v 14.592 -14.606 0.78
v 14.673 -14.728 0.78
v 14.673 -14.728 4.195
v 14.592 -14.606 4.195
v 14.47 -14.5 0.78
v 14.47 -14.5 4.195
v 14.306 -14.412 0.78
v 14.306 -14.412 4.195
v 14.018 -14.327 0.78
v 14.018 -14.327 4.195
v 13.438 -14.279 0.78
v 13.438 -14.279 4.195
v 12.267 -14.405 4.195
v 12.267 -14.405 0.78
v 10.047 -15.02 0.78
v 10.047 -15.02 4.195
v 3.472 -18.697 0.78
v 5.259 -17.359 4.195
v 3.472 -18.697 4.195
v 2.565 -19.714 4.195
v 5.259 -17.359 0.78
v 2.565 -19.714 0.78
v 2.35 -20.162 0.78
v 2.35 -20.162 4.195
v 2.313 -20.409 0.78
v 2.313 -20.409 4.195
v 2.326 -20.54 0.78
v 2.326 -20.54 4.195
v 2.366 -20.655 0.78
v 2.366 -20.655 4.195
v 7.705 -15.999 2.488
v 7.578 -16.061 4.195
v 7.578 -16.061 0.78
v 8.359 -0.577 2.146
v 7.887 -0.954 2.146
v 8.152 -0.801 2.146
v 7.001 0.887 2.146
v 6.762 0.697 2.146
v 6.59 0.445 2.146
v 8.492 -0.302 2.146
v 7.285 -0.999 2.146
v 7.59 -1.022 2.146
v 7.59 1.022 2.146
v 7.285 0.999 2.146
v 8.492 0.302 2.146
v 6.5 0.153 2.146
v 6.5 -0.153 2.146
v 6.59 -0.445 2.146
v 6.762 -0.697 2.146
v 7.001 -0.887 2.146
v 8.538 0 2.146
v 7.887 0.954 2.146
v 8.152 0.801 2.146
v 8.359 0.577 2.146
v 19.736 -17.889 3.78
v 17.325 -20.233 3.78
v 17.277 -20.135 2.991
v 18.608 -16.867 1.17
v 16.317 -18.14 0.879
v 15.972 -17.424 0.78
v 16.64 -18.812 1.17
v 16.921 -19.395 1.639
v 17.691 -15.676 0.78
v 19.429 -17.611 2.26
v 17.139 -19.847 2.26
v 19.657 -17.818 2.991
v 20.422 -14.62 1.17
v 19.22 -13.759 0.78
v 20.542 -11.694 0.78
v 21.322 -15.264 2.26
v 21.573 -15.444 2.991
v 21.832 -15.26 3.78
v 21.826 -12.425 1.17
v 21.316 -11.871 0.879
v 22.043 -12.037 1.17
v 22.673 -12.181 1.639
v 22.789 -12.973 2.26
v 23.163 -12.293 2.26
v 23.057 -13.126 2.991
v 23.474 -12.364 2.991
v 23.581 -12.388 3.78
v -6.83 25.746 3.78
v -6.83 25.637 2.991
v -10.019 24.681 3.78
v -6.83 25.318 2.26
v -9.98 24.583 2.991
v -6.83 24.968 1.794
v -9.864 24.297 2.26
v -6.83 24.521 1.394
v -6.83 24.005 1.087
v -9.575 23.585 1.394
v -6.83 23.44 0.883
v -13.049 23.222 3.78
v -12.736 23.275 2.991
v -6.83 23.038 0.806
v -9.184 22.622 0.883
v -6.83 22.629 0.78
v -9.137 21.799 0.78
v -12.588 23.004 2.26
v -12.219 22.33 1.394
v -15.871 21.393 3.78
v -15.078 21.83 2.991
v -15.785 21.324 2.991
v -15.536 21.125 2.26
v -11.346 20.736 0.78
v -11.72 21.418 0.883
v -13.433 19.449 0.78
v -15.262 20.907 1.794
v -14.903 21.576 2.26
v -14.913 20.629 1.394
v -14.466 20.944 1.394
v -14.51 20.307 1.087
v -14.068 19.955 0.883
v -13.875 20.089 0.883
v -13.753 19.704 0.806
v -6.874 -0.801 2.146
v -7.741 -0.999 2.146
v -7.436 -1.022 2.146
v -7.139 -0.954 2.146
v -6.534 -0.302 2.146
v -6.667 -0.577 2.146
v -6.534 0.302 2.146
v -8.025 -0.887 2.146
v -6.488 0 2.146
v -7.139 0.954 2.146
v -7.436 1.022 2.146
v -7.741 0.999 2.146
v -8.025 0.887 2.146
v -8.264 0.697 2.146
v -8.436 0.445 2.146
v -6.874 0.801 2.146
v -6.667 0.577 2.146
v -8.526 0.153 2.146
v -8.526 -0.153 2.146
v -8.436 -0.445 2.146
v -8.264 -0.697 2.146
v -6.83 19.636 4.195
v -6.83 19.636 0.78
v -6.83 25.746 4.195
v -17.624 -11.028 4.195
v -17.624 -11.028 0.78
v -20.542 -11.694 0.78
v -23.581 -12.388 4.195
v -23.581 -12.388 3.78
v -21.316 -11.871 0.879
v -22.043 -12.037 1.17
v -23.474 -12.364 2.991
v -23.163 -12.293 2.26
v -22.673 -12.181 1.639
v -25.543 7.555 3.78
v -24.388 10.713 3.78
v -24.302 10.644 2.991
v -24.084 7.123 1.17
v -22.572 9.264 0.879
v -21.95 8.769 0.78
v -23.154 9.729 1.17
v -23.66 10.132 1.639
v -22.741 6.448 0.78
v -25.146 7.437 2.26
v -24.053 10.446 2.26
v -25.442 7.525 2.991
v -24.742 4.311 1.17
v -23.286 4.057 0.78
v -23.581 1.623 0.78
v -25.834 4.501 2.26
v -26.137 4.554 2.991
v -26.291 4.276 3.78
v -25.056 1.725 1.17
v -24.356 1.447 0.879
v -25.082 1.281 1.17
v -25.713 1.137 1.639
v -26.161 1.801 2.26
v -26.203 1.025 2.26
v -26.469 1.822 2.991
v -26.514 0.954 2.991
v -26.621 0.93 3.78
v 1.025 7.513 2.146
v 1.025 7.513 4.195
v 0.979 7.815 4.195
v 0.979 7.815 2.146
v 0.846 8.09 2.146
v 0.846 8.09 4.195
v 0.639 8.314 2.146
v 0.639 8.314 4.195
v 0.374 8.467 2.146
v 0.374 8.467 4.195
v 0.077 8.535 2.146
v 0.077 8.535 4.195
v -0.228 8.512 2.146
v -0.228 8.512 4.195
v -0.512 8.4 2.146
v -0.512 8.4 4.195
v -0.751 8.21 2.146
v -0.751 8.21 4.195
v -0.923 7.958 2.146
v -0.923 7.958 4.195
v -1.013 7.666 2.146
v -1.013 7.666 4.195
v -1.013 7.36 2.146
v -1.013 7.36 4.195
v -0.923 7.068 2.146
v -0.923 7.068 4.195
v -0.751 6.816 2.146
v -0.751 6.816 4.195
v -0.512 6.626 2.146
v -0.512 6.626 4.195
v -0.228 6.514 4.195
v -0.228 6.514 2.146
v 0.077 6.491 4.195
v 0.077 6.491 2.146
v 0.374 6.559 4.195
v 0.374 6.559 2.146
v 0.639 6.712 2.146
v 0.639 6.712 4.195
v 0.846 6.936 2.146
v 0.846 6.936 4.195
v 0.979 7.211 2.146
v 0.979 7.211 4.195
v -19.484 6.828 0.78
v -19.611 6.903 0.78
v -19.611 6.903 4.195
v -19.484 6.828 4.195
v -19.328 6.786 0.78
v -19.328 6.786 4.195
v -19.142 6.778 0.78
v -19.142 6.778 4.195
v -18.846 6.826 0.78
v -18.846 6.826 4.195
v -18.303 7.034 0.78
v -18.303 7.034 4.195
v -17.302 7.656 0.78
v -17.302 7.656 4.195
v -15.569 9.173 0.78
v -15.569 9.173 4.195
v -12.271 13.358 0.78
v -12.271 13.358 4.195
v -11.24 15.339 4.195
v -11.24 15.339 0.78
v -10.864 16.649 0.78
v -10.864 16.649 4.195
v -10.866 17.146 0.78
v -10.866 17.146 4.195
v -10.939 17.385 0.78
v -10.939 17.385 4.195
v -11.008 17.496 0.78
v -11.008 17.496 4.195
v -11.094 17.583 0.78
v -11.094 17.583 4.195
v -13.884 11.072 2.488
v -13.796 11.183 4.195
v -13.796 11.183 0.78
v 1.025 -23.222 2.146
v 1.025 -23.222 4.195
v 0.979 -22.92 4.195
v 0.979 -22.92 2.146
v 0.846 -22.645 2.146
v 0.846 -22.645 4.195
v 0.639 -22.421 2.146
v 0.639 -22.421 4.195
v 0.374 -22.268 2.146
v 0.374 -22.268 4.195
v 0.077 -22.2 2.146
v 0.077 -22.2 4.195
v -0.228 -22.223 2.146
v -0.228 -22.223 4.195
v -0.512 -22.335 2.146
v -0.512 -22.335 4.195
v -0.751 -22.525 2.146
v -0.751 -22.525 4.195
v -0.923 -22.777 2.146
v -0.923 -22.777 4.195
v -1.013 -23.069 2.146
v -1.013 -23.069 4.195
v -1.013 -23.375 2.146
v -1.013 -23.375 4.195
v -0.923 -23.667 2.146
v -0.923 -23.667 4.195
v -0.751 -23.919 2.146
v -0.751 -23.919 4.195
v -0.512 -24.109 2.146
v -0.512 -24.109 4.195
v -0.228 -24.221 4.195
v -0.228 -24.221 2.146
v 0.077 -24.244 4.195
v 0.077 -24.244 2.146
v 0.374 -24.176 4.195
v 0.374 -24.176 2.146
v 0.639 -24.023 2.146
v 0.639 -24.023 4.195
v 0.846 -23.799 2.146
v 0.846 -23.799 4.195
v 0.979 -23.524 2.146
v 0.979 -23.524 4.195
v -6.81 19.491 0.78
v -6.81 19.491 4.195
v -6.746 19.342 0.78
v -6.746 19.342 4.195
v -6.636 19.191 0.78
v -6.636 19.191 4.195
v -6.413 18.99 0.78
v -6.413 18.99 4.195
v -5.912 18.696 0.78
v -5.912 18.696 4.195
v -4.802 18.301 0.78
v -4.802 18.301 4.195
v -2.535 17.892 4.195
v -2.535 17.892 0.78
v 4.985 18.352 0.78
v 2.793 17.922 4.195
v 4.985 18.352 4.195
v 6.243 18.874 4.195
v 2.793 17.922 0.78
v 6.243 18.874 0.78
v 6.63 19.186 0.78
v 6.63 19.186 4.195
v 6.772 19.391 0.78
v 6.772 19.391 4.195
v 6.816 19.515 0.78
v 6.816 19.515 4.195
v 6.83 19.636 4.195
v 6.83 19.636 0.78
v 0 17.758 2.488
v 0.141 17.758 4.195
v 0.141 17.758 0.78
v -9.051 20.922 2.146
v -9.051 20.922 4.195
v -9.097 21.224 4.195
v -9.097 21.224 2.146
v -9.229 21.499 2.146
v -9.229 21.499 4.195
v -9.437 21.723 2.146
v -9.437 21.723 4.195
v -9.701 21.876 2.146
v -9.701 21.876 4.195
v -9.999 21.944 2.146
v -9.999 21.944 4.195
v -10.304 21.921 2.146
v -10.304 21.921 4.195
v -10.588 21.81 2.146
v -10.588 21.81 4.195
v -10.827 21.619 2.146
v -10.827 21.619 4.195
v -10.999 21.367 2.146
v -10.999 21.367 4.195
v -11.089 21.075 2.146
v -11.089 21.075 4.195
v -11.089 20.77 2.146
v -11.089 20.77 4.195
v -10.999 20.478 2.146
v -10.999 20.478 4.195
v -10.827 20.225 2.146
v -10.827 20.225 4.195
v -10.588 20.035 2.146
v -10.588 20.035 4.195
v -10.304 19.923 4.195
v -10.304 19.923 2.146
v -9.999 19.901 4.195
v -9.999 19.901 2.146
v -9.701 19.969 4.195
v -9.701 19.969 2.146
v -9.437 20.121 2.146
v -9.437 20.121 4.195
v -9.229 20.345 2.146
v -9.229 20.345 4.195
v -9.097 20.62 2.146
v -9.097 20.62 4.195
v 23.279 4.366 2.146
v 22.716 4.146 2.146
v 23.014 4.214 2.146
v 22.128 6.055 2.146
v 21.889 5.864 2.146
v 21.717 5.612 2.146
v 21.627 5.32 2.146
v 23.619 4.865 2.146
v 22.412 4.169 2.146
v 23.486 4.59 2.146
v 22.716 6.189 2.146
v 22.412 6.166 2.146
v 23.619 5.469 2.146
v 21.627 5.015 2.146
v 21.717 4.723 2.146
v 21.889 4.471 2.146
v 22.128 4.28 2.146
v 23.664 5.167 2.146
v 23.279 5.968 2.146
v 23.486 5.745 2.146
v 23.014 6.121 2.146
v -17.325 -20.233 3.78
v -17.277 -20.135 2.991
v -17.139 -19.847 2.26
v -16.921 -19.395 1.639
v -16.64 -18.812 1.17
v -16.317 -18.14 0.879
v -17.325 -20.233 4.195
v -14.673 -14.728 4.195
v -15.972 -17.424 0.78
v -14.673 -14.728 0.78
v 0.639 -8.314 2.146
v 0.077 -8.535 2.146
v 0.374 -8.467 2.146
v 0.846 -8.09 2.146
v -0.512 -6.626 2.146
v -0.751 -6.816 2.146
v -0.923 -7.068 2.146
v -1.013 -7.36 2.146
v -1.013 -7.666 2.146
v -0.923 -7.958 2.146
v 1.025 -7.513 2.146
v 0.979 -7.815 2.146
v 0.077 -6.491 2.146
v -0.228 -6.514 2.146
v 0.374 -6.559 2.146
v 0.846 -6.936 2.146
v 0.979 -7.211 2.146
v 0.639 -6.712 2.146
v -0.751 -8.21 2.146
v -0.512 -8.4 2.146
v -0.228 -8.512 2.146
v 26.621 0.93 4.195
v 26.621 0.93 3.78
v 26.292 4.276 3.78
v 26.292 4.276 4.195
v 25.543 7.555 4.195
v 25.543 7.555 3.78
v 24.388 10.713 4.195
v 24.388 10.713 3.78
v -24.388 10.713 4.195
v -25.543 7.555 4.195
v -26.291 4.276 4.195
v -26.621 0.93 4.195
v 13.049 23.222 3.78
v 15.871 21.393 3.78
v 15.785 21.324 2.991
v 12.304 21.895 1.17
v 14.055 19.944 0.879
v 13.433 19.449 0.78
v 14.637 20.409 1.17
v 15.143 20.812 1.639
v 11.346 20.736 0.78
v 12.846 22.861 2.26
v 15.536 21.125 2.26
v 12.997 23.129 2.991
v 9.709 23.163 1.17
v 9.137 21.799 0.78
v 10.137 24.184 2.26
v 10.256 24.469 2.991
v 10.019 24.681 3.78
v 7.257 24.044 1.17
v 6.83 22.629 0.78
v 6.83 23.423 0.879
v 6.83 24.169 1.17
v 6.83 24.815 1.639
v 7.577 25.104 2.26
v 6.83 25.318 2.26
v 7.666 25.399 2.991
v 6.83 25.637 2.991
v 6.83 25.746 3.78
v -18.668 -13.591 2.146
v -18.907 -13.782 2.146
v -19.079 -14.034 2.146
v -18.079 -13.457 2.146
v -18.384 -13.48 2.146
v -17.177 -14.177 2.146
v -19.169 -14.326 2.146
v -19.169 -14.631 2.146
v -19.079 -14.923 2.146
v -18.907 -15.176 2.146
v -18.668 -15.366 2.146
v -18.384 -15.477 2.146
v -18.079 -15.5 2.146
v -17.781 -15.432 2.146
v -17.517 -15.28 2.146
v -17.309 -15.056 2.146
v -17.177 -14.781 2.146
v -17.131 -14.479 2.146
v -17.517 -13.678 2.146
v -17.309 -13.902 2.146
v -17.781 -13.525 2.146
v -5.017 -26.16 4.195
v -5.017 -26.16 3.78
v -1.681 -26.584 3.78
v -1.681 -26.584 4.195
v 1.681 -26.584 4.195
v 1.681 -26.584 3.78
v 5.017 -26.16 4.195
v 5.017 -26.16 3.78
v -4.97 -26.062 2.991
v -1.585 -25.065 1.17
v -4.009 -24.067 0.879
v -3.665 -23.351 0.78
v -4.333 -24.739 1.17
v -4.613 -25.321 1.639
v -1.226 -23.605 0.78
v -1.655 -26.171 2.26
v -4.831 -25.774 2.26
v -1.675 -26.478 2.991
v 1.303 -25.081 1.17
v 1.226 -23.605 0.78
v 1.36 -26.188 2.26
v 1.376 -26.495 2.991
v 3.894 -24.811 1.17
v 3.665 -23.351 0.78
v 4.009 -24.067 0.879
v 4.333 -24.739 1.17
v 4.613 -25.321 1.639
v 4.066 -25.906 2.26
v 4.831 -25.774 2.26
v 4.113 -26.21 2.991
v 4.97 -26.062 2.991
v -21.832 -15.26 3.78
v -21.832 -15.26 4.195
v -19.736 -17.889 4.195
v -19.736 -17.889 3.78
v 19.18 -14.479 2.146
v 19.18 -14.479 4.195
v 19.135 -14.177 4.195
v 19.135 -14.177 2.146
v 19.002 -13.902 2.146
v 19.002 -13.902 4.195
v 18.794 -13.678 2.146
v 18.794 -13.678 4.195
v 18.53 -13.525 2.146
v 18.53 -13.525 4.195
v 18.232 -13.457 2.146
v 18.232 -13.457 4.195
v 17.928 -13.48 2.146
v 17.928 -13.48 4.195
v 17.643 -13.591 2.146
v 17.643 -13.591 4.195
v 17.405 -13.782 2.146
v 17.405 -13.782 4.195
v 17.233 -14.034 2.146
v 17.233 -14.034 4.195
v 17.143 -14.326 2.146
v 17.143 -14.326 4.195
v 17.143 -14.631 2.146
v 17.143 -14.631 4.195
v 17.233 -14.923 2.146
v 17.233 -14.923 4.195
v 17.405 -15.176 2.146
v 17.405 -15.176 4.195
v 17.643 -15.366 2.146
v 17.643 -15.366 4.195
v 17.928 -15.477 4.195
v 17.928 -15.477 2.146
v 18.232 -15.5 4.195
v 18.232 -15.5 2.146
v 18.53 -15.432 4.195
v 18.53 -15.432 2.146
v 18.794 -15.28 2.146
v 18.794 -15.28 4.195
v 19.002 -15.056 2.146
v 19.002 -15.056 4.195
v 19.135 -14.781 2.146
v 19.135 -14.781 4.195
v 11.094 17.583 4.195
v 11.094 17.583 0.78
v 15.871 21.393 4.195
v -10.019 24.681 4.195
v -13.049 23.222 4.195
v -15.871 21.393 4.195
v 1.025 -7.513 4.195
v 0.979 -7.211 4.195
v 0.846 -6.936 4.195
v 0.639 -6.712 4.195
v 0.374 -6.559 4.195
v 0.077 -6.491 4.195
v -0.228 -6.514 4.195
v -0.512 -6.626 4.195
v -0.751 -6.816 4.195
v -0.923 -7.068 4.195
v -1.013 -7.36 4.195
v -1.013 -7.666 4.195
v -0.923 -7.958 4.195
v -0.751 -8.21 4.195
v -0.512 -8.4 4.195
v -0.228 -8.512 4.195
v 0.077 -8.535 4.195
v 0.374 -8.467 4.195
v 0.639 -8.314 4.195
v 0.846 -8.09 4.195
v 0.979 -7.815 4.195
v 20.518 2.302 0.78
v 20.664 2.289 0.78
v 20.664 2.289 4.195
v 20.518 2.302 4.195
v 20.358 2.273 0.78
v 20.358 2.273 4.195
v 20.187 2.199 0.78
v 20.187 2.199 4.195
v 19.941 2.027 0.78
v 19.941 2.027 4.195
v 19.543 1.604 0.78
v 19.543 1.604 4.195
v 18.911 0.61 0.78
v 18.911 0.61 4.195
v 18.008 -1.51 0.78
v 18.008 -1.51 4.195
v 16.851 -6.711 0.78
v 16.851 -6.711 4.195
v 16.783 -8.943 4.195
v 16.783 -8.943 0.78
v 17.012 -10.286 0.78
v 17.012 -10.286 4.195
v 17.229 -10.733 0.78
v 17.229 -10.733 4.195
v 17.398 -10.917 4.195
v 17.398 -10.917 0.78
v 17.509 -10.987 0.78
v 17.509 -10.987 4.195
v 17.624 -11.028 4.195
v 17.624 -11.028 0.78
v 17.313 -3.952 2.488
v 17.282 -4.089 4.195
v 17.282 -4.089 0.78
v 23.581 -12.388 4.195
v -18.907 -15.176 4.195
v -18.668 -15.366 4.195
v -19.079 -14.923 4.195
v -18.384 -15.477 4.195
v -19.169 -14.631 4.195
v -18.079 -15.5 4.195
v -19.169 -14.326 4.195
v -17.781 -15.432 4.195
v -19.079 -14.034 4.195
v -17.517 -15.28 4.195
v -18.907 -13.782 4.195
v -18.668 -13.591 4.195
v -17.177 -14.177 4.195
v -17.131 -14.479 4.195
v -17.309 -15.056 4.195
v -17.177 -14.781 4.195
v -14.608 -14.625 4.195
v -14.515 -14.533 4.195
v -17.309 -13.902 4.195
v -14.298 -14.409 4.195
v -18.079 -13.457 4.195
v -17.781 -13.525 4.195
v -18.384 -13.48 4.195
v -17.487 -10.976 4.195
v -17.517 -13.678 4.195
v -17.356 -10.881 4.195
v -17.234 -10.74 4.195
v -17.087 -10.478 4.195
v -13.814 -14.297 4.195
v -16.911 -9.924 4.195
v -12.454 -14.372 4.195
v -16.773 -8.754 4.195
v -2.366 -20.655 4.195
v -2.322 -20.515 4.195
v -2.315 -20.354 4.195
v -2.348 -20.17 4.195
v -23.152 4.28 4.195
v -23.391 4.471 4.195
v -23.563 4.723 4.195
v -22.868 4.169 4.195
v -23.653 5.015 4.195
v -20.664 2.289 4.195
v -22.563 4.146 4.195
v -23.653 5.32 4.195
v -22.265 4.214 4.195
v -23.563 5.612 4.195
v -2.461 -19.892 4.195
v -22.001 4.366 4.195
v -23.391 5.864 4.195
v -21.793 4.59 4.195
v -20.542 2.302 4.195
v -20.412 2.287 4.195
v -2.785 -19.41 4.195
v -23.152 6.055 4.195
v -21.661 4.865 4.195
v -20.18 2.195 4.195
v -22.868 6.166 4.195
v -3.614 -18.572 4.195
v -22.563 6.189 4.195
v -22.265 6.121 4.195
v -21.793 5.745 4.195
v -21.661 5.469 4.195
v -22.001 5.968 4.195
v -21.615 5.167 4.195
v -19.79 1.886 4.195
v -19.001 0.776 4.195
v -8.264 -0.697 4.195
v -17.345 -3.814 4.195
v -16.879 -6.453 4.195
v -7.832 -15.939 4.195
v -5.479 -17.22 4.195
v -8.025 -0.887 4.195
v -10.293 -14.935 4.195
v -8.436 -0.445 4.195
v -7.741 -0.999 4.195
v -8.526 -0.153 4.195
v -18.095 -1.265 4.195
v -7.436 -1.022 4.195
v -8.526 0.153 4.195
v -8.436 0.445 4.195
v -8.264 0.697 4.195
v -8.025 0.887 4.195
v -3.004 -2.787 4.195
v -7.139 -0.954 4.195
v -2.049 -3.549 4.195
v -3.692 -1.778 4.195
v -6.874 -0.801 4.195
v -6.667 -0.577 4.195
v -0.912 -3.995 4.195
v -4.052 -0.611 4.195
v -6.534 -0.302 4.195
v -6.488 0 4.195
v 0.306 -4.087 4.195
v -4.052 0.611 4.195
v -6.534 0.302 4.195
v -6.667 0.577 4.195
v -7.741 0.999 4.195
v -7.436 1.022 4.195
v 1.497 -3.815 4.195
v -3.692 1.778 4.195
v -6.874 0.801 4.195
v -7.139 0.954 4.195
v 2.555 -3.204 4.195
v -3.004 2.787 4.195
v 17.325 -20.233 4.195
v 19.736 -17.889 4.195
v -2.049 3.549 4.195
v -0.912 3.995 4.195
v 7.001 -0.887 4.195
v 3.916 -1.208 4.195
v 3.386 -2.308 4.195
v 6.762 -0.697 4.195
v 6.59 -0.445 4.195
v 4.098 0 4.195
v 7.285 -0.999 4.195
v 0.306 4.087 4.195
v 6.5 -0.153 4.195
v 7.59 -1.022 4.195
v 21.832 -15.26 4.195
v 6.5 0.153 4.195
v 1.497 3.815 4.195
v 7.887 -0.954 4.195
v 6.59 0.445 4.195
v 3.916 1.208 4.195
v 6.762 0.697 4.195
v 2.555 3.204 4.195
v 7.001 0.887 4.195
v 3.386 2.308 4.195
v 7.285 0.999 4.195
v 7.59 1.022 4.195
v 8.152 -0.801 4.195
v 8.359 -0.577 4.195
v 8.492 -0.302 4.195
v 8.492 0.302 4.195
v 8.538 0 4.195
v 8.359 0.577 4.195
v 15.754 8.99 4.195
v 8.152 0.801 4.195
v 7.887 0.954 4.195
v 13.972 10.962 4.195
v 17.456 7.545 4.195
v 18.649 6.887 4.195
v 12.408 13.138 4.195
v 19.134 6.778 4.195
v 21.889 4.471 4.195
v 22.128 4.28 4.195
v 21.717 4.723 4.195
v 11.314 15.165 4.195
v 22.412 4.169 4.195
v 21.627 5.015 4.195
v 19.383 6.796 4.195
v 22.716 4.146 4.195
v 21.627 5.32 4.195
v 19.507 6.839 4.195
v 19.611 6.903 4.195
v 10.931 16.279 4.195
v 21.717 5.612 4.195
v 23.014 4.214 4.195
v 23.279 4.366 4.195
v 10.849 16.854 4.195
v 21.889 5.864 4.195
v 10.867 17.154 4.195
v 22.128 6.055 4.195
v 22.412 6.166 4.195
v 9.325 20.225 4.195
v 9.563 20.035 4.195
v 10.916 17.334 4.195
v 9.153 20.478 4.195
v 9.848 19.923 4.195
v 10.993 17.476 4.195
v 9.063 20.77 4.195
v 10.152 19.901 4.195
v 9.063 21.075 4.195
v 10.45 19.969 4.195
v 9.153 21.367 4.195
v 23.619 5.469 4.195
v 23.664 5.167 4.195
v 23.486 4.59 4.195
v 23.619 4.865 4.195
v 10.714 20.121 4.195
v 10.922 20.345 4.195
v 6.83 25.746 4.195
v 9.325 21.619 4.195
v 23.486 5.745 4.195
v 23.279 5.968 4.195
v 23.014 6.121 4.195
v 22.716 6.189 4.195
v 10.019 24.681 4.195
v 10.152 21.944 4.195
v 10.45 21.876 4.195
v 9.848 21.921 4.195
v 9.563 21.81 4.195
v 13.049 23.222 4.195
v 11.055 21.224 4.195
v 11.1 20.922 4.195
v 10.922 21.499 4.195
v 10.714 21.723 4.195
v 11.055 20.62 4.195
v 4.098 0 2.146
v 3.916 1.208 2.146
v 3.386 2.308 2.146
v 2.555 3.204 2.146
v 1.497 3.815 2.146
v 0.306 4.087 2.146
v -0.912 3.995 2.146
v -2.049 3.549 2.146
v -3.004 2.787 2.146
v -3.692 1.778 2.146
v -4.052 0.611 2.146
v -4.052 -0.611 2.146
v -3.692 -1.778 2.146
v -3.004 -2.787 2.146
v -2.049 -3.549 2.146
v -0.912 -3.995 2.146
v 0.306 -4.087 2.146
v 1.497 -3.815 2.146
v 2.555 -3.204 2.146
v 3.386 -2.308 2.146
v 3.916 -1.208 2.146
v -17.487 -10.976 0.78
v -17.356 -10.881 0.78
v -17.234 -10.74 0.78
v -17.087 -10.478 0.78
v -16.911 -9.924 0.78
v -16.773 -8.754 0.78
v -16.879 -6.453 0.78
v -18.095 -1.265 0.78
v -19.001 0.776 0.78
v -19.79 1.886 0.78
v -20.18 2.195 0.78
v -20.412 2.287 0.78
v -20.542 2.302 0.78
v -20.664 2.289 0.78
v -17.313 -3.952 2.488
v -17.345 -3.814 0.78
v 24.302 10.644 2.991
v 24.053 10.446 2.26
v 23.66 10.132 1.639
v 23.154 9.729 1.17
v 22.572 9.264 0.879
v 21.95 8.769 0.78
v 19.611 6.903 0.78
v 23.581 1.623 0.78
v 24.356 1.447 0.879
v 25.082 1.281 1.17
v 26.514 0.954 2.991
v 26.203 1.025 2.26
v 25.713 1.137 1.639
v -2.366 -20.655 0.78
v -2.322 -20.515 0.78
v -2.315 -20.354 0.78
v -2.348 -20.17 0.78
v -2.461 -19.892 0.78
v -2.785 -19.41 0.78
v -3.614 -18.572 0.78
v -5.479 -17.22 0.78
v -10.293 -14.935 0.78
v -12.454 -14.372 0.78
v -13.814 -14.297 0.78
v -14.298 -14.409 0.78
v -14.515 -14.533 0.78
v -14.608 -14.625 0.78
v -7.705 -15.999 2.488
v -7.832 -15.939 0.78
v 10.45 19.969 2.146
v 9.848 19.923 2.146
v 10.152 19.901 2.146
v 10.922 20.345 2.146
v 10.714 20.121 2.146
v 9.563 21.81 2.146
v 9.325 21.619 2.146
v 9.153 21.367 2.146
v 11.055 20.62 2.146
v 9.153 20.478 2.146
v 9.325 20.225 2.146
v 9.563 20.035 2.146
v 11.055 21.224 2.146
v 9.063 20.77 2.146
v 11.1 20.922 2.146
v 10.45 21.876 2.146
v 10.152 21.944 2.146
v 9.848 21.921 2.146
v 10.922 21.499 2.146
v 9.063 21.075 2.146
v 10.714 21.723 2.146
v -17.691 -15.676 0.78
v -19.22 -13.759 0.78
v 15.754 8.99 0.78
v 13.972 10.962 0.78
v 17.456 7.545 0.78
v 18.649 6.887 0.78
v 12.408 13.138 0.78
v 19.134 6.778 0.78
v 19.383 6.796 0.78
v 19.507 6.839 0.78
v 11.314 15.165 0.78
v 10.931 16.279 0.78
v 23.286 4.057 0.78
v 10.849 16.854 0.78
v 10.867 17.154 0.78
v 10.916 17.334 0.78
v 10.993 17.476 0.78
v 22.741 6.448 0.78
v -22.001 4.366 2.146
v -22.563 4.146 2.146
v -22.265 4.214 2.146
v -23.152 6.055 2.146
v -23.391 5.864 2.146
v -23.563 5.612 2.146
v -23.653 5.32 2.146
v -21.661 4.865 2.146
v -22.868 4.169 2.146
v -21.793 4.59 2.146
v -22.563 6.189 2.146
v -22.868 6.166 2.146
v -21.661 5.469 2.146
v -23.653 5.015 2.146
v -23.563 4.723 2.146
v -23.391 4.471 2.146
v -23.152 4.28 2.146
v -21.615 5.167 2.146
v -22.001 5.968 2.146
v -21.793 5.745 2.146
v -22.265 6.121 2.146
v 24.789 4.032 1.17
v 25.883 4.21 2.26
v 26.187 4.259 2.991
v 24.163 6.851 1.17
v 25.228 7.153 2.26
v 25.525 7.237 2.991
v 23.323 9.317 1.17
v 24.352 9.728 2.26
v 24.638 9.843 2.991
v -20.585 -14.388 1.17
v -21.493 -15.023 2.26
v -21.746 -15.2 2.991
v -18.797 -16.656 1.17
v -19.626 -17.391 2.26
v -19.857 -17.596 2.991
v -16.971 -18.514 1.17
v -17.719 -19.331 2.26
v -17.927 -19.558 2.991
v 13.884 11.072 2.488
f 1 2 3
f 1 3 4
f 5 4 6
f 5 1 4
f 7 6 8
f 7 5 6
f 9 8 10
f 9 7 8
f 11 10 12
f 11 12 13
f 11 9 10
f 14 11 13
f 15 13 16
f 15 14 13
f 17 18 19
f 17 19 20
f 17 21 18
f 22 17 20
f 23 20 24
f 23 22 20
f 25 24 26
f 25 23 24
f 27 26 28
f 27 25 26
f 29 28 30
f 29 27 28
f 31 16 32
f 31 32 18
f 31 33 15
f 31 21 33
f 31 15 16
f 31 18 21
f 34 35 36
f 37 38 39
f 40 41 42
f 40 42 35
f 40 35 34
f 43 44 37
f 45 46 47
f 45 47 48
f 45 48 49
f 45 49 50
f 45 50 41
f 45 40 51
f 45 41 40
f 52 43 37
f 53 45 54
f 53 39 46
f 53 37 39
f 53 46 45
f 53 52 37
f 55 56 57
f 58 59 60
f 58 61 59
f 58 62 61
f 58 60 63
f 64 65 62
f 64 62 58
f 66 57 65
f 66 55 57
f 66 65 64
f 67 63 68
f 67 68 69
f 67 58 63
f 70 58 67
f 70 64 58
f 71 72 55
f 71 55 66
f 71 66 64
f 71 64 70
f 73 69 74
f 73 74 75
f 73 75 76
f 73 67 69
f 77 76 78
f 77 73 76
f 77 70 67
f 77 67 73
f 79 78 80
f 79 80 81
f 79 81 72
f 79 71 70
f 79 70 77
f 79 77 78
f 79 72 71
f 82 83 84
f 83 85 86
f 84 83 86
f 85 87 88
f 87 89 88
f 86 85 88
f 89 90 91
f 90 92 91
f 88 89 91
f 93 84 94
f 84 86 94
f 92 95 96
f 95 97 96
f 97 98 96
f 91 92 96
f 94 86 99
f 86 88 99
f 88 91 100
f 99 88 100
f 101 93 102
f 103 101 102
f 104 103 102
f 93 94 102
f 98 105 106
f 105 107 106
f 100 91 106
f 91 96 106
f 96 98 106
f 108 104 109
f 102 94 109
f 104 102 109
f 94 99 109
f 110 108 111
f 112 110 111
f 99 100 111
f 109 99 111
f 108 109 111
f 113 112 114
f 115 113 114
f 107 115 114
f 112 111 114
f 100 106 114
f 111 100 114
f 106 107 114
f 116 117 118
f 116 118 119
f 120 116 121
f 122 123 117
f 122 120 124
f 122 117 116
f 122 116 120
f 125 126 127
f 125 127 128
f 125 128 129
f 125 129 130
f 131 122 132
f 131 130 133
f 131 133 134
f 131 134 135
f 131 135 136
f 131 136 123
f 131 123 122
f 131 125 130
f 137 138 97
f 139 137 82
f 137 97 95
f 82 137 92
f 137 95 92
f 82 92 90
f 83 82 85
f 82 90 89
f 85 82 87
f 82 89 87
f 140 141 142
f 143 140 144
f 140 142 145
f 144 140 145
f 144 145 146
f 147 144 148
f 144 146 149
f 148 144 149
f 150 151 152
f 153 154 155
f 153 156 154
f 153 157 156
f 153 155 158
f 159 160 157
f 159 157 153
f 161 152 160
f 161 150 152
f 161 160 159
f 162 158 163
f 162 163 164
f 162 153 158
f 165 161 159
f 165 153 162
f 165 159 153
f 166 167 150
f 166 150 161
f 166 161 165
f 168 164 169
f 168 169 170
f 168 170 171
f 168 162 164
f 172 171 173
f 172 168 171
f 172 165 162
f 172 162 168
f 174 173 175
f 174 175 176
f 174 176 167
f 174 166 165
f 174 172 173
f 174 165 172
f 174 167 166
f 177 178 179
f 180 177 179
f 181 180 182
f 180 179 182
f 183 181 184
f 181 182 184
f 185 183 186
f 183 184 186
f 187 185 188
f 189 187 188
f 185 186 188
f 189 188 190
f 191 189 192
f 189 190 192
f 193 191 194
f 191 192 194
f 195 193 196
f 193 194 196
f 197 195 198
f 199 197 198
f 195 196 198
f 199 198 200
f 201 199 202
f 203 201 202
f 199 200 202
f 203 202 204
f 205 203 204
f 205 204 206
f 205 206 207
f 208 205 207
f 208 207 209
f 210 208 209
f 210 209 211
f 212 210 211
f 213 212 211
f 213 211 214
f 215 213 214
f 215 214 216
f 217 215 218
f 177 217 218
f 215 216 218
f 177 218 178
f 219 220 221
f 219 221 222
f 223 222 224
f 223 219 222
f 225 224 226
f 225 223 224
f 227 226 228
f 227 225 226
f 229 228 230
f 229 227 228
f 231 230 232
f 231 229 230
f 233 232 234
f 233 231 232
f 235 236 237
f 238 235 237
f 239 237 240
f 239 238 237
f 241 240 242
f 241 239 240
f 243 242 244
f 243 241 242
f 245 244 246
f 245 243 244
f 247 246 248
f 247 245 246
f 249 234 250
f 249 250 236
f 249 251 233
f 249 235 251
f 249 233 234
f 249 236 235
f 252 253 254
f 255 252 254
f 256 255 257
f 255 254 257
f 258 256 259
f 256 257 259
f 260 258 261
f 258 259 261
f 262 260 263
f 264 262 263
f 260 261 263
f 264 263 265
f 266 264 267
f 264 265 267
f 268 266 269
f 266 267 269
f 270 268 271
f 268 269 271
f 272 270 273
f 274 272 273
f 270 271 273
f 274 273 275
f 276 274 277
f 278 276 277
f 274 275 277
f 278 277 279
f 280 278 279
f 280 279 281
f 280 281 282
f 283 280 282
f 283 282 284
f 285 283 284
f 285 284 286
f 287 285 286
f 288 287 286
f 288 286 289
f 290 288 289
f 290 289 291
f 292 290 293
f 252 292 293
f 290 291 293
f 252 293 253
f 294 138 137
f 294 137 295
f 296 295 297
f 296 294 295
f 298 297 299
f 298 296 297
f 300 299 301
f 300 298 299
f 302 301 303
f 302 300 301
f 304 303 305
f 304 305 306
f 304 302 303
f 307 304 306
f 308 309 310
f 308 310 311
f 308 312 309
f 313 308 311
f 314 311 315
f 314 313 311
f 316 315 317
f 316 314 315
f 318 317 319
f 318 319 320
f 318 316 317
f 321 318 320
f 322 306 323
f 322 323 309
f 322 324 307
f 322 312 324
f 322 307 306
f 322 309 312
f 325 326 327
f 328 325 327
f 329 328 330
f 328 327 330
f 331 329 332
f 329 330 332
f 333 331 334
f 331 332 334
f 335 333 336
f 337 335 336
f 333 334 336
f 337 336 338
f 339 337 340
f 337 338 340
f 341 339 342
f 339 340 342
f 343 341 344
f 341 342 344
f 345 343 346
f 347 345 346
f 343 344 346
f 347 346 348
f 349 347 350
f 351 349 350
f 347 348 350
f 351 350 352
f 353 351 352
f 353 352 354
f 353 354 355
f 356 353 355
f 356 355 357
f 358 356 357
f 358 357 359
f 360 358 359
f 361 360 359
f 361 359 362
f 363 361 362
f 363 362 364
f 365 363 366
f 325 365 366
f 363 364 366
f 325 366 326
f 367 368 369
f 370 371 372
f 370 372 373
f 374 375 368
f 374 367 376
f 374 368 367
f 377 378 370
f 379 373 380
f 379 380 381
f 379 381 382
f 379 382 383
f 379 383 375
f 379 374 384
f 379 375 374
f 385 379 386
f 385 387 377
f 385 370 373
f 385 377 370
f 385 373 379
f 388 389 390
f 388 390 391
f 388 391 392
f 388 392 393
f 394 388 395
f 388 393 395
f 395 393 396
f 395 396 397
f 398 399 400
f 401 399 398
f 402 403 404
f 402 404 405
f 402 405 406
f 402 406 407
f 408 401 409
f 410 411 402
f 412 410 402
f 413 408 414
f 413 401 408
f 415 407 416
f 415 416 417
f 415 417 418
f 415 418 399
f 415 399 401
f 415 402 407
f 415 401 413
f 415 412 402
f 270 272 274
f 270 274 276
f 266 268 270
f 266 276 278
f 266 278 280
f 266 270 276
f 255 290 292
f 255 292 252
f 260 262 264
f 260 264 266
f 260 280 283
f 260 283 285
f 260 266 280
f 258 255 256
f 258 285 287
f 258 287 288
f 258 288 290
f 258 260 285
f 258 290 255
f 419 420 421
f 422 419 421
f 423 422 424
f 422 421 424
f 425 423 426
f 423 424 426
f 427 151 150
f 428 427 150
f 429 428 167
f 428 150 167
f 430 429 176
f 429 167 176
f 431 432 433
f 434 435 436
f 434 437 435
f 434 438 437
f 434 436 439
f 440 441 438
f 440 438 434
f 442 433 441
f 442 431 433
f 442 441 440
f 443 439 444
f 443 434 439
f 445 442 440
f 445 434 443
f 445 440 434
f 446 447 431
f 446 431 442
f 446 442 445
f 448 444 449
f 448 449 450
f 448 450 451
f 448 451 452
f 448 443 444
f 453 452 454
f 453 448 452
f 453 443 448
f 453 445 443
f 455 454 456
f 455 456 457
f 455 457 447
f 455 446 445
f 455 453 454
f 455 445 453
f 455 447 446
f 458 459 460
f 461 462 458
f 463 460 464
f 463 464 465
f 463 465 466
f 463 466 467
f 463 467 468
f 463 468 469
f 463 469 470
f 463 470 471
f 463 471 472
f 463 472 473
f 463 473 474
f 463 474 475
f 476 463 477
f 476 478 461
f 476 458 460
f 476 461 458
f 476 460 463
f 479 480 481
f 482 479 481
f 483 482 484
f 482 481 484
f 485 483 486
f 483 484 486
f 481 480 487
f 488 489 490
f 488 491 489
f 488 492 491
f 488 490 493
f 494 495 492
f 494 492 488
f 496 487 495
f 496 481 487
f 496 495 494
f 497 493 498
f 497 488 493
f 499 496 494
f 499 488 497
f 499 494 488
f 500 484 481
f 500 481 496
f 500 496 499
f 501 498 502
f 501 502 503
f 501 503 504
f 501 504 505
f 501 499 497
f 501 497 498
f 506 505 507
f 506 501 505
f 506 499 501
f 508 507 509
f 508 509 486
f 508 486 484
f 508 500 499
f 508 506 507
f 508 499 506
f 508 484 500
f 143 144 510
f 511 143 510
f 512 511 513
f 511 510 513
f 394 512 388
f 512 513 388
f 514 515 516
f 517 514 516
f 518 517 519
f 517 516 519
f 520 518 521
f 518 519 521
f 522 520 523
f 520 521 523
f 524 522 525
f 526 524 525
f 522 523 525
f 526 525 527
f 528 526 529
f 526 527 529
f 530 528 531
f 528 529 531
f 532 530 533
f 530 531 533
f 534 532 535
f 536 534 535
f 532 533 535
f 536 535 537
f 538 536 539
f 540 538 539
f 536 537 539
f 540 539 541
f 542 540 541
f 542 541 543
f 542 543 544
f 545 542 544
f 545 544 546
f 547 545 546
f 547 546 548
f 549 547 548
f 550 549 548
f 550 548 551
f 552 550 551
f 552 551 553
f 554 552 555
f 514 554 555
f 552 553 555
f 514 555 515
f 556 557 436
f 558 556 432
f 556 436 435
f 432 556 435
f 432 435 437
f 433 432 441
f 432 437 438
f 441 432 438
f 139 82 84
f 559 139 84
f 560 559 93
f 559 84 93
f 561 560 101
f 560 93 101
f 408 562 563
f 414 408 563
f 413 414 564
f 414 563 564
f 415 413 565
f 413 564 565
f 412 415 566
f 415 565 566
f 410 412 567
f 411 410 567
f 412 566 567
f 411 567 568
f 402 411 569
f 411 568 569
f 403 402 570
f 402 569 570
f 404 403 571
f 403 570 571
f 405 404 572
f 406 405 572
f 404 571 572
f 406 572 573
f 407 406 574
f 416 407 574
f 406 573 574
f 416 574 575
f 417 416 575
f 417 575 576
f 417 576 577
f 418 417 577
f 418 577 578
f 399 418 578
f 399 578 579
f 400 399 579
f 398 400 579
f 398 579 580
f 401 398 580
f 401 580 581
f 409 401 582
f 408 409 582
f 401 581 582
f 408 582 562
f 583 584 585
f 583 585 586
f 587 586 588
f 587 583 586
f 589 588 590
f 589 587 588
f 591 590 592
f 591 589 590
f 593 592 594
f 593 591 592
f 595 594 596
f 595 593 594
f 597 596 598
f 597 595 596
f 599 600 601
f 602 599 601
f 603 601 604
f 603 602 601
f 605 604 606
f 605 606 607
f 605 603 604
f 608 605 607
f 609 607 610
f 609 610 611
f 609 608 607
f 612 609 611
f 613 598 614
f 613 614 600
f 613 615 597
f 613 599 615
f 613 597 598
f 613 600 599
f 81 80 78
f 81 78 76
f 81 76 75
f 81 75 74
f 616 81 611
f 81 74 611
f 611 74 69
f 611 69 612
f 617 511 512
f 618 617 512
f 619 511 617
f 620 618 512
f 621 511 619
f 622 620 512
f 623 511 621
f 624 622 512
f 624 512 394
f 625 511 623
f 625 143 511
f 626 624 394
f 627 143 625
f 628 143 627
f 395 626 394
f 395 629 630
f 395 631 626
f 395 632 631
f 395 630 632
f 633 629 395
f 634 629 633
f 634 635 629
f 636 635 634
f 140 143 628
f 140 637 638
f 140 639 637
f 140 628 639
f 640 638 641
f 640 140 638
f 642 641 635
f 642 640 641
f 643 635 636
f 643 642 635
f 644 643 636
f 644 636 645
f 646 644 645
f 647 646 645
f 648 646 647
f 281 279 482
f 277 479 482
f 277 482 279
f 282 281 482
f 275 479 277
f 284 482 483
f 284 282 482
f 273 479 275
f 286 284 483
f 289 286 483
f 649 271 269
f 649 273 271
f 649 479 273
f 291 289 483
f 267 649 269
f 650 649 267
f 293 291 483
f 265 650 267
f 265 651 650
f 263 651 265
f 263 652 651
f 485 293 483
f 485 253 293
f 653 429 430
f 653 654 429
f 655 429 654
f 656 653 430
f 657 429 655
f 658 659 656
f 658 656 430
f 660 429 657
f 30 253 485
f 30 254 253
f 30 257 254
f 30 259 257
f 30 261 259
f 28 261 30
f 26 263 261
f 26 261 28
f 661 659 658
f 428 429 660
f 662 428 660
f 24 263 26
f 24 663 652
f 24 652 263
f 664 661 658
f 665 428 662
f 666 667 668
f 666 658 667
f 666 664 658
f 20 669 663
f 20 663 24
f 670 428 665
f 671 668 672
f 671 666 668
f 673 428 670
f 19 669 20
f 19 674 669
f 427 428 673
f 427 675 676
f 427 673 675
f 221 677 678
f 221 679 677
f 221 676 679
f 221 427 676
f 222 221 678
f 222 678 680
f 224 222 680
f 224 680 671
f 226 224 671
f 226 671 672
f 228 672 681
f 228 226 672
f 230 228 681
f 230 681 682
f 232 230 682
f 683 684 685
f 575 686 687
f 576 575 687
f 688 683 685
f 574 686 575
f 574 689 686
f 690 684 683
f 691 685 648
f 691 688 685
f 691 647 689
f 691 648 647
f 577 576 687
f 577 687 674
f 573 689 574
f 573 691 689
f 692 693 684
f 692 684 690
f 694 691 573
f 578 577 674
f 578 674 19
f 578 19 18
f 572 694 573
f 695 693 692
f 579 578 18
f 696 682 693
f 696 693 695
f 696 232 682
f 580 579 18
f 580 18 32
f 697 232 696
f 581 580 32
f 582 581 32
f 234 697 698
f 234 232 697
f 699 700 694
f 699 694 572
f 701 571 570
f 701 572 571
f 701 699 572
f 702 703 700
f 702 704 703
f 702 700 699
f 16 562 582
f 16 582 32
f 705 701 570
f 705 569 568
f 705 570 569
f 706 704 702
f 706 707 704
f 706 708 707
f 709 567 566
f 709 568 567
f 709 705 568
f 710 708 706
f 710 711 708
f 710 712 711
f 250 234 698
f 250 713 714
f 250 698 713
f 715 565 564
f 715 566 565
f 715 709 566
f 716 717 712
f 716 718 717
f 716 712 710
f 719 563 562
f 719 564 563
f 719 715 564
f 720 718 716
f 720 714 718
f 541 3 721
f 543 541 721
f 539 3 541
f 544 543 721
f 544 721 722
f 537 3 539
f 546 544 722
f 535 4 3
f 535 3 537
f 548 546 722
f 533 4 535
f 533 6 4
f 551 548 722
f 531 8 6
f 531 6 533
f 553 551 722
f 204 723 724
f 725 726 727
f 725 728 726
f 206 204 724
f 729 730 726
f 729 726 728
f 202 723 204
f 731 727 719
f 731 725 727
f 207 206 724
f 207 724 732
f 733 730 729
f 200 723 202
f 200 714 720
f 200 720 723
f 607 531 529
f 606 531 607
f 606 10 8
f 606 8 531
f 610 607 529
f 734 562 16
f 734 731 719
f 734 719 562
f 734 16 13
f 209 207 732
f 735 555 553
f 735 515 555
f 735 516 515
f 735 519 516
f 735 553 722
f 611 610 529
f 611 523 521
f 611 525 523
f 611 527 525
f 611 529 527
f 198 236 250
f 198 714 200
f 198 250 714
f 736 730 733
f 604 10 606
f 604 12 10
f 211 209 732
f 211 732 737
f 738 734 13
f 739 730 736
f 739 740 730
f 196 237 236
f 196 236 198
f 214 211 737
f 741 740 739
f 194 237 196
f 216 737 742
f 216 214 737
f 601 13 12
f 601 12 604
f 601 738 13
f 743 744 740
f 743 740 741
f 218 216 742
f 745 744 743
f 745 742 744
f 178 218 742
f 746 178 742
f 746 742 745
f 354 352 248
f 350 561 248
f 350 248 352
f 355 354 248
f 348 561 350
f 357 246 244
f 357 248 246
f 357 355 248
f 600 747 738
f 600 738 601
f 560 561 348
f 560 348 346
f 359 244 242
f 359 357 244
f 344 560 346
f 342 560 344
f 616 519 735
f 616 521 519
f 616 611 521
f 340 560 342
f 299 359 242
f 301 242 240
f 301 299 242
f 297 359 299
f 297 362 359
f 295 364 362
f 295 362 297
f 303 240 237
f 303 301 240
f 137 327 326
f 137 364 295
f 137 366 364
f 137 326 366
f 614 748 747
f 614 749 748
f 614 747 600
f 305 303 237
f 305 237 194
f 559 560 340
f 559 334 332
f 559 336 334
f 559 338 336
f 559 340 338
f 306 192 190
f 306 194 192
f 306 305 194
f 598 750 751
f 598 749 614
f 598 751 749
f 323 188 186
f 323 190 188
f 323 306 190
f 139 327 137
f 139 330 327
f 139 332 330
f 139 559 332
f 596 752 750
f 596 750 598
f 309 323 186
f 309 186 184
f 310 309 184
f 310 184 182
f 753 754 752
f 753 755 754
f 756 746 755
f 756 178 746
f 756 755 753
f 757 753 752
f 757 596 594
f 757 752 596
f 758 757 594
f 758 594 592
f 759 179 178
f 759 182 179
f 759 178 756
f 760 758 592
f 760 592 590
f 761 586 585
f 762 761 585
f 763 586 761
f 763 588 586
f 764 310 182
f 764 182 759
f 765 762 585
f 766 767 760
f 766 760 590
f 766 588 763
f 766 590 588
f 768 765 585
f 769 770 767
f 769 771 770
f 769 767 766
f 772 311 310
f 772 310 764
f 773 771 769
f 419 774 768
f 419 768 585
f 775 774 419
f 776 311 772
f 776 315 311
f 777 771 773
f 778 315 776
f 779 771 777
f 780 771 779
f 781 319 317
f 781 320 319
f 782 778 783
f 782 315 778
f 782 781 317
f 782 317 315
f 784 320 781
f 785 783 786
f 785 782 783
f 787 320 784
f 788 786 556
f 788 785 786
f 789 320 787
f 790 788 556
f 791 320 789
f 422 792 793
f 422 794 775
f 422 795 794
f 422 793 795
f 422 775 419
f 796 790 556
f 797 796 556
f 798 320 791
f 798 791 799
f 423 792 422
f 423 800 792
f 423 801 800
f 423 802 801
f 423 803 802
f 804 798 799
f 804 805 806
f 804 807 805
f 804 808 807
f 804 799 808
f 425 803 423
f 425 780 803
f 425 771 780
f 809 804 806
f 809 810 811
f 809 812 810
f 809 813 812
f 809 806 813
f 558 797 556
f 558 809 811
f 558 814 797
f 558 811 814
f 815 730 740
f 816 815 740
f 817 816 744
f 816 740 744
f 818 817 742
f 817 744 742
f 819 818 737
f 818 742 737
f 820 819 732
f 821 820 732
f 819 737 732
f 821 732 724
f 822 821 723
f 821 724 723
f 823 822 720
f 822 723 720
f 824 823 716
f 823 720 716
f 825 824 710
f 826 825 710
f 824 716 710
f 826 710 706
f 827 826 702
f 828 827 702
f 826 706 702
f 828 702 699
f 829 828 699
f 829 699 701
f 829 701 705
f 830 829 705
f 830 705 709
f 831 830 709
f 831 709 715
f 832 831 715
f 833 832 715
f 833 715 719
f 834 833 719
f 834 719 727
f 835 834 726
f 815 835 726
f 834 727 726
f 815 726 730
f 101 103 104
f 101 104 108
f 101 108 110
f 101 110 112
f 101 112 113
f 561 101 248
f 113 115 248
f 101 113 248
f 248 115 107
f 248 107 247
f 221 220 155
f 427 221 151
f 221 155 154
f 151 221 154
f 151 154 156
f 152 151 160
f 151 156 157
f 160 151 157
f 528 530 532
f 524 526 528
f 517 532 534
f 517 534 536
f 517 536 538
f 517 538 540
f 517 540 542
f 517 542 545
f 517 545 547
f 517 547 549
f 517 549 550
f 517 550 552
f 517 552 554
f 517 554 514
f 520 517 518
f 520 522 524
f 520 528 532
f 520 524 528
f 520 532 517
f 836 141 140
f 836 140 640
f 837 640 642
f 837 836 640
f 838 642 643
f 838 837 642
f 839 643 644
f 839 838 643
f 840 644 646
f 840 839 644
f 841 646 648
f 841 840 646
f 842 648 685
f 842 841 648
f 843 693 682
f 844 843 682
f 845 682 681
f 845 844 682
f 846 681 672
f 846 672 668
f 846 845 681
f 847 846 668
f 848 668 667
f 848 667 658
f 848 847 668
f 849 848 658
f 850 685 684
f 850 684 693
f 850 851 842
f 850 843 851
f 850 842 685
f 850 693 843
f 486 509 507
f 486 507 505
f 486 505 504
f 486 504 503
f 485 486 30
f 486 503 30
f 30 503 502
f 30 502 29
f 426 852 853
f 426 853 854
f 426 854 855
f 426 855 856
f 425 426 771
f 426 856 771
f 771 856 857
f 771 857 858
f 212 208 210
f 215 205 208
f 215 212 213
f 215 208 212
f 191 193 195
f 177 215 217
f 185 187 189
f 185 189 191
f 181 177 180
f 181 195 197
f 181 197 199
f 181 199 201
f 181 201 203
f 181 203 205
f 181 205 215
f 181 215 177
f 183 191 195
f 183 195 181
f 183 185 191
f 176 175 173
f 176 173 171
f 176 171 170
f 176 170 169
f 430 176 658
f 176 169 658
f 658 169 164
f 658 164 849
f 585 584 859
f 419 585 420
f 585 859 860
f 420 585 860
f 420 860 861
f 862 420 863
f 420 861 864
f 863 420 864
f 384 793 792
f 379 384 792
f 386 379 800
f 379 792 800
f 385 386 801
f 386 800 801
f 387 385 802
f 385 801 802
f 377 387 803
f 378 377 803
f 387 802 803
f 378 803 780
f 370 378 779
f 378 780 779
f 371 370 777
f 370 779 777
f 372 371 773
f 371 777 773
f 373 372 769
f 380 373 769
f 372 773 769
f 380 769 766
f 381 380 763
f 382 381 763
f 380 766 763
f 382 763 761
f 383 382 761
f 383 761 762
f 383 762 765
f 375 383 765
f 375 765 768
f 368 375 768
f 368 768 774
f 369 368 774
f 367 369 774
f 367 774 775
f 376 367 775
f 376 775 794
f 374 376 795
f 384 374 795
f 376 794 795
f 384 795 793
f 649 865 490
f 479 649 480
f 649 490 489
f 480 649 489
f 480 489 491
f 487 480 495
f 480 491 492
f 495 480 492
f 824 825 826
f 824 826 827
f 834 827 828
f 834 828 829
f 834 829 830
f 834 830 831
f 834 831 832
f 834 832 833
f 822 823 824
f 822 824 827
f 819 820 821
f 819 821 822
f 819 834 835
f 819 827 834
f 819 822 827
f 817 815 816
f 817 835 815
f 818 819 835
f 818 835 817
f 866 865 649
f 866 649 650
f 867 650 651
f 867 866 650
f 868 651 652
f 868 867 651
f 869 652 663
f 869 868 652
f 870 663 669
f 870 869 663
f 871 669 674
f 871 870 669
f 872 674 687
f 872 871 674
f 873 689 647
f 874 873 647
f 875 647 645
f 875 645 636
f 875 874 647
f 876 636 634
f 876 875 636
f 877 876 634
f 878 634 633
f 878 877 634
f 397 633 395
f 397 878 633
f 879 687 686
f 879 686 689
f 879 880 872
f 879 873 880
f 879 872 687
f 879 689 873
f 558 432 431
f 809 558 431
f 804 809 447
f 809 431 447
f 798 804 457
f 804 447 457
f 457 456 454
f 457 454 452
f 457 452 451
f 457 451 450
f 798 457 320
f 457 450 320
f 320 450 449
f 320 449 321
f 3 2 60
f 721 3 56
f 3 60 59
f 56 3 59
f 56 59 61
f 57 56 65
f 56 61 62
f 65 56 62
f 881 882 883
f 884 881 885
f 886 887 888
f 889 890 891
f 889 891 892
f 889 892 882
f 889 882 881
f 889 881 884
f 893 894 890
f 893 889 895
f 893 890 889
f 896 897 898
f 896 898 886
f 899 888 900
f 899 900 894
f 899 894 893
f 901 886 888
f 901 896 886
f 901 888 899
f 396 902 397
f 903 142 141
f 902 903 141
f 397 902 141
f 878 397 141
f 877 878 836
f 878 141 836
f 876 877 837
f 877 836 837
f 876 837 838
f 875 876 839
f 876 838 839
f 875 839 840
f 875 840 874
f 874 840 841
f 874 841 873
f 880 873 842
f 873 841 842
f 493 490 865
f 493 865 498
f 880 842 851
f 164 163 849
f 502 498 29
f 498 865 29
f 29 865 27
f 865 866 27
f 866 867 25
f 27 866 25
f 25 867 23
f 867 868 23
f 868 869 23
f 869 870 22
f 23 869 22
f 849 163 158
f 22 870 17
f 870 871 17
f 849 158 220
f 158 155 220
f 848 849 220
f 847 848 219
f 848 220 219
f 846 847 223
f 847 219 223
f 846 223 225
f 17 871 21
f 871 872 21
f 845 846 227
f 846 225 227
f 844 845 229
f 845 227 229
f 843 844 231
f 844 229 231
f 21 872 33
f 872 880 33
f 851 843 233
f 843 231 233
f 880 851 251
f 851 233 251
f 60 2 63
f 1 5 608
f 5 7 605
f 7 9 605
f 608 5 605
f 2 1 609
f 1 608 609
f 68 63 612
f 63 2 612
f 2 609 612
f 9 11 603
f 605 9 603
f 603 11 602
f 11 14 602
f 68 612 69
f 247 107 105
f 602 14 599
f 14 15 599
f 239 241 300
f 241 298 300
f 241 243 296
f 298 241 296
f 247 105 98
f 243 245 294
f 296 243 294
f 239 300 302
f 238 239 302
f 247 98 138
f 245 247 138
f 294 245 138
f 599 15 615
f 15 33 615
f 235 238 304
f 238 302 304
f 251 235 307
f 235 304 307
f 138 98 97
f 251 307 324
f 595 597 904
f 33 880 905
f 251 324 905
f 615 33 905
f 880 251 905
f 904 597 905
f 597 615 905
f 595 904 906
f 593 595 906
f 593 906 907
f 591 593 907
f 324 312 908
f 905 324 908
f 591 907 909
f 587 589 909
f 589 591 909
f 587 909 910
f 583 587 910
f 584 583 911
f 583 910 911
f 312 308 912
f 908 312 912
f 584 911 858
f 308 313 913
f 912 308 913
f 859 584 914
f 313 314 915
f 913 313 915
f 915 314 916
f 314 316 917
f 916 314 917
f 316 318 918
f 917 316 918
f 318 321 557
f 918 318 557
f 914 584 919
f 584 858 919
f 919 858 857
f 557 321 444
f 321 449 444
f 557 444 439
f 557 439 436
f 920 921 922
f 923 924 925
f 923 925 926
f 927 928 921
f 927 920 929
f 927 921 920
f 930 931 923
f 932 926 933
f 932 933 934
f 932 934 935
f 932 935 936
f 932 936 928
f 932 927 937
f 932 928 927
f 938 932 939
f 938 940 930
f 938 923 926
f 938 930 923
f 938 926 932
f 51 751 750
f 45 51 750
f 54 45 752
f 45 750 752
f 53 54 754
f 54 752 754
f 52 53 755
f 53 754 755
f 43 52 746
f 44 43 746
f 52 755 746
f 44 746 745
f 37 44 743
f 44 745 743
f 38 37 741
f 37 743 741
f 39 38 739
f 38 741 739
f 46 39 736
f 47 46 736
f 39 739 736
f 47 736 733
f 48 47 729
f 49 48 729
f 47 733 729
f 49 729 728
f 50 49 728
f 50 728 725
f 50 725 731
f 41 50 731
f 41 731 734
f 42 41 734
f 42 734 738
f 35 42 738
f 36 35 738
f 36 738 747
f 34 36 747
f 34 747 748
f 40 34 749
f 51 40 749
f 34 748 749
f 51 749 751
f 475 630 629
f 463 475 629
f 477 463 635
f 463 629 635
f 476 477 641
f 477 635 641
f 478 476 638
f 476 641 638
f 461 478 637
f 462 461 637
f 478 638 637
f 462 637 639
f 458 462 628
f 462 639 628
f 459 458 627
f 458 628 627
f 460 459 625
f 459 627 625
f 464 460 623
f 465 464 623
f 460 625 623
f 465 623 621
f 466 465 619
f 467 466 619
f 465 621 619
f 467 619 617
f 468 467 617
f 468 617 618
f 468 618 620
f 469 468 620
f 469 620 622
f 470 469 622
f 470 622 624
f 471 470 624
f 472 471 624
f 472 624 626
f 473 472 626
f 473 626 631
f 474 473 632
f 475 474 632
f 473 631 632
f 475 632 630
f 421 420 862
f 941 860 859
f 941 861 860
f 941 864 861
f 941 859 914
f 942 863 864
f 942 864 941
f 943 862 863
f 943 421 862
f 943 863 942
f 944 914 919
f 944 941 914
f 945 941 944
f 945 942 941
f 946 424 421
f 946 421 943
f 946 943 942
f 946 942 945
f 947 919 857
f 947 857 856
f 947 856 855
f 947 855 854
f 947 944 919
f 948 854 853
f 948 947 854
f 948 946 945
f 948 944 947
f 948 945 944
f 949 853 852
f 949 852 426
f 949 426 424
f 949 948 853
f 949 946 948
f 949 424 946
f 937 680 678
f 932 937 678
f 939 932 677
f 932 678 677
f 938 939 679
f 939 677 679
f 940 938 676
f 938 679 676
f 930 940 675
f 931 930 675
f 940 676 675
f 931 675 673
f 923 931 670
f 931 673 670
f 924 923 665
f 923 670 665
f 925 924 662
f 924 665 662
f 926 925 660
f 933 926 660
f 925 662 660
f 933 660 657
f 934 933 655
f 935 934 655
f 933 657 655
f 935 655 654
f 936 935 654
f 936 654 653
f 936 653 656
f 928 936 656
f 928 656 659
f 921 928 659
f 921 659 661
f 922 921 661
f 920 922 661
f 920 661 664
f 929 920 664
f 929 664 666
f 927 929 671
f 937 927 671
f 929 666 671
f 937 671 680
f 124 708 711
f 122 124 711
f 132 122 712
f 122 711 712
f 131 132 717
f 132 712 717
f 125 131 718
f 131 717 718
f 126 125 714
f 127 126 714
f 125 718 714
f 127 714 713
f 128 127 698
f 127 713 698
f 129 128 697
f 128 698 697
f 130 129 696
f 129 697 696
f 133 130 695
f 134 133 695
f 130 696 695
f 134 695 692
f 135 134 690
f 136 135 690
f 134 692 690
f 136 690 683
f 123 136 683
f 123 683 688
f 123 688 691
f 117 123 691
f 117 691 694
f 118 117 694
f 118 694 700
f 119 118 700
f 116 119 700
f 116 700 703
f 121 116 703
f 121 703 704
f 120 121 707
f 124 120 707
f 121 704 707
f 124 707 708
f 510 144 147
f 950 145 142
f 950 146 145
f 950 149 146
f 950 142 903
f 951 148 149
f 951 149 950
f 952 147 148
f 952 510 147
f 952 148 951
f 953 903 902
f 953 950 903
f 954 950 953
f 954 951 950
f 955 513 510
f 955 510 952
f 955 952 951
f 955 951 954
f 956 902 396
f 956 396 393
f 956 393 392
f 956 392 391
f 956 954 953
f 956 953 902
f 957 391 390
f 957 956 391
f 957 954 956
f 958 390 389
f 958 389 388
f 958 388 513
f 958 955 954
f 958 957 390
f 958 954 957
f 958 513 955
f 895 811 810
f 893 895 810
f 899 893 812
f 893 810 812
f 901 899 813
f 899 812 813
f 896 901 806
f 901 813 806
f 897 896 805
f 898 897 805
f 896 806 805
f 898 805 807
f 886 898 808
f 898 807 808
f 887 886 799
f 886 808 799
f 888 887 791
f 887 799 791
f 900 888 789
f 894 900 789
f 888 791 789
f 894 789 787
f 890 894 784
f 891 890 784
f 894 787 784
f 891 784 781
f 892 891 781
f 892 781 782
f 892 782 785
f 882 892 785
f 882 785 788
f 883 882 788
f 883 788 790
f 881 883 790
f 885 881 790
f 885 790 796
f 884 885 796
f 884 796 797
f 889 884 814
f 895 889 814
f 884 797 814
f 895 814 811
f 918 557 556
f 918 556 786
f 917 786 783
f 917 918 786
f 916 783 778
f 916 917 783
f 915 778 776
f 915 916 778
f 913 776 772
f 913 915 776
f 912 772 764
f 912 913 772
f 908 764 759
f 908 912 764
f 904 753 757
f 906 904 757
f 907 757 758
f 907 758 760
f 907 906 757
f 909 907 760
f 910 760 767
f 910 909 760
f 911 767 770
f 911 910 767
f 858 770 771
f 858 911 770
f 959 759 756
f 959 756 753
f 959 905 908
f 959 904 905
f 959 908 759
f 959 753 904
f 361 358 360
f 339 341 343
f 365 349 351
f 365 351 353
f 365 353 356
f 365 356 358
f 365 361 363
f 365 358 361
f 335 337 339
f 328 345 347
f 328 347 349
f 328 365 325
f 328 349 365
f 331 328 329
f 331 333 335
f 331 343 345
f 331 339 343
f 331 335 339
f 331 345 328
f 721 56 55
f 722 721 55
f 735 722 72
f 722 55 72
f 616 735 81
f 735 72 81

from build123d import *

# Parameters (mm, degrees)
EXTRUDE_2_DEPTH     = 5
SKETCH_3_R          = 1.5
SKETCH_3_R_2        = 6
CUT_EXTRUDE_2_DEPTH = 3
SCALE_1_SCALE       = 0.683
FILLET_2_R          = 3


with BuildPart() as part:
    # 草图1 → 凸台-拉伸2 (new body)
    with BuildSketch(Plane.XY):
        with BuildLine():
            Line((-10, 28.75), (-10, 37.69615365))
            ThreePointArc((-10, 37.69615365), (-16.921465826, 35.137785848), (-23.237141673, 31.321482195))
            Line((-23.237141673, 31.321482195), (-16.242757102, 25.743646628))
            add(Edge.make_bspline(
                [(-28.71255314, 10.107016979), (-26.562516563, 8.392420024), (-20.327618544, 16.210734848), (-14.092720526, 24.029049673), (-16.242757102, 25.743646628)],
                knots=[3.141592654, 3.141592654, 3.141592654, 4.71238898, 4.71238898, 6.283185307, 6.283185307, 6.283185307], degree=2, weights=[1, 0.707106781, 1, 0.707106781, 1]))
            Line((-28.71255314, 10.107016979), (-35.70693771, 15.684852545))
            ThreePointArc((-35.70693771, 15.684852545), (-38.022188575, 8.678316424), (-38.976241715, 1.361095805))
            Line((-38.976241715, 1.361095805), (-30.254386815, 3.351802271))
            add(Edge.make_bspline(
                [(-25.803968136, -16.146755973), (-23.122916377, -15.534823405), (-25.348125717, -5.785544283), (-27.573335056, 3.963734839), (-30.254386815, 3.351802271)],
                knots=[3.141592654, 3.141592654, 3.141592654, 4.71238898, 4.71238898, 6.283185307, 6.283185307, 6.283185307], degree=2, weights=[1, 0.707106781, 1, 0.707106781, 1]))
            Line((-25.803968136, -16.146755973), (-34.525823036, -18.137462439))
            ThreePointArc((-34.525823036, -18.137462439), (-30.491427816, -24.316102272), (-25.365436775, -29.624223487))
            Line((-25.365436775, -29.624223487), (-21.483846179, -21.564017561))
            add(Edge.make_bspline(
                [(-3.464468821, -30.241692343), (-2.271288538, -27.764027957), (-11.280977217, -23.425190565), (-20.290665896, -19.086353174), (-21.483846179, -21.564017561)],
                knots=[3.141592654, 3.141592654, 3.141592654, 4.71238898, 4.71238898, 6.283185307, 6.283185307, 6.283185307], degree=2, weights=[1, 0.707106781, 1, 0.707106781, 1]))
            Line((-3.464468821, -30.241692343), (-7.346059417, -38.301898269))
            ThreePointArc((-7.346059417, -38.301898269), (0, -39), (7.346059417, -38.301898269))
            Line((7.346059417, -38.301898269), (3.464468821, -30.241692343))
            add(Edge.make_bspline(
                [(21.483846179, -21.564017561), (20.290665896, -19.086353174), (11.280977217, -23.425190565), (2.271288538, -27.764027957), (3.464468821, -30.241692343)],
                knots=[3.141592654, 3.141592654, 3.141592654, 4.71238898, 4.71238898, 6.283185307, 6.283185307, 6.283185307], degree=2, weights=[1, 0.707106781, 1, 0.707106781, 1]))
            Line((21.483846179, -21.564017561), (25.365436775, -29.624223487))
            ThreePointArc((25.365436775, -29.624223487), (30.491427816, -24.316102272), (34.525823036, -18.137462439))
            Line((34.525823036, -18.137462439), (25.803968136, -16.146755973))
            add(Edge.make_bspline(
                [(30.254386815, 3.351802271), (27.573335056, 3.963734839), (25.348125717, -5.785544283), (23.122916377, -15.534823405), (25.803968136, -16.146755973)],
                knots=[3.141592654, 3.141592654, 3.141592654, 4.71238898, 4.71238898, 6.283185307, 6.283185307, 6.283185307], degree=2, weights=[1, 0.707106781, 1, 0.707106781, 1]))
            Line((30.254386815, 3.351802271), (38.976241715, 1.361095805))
            ThreePointArc((38.976241715, 1.361095805), (38.022188575, 8.678316424), (35.70693771, 15.684852545))
            Line((35.70693771, 15.684852545), (28.71255314, 10.107016979))
            add(Edge.make_bspline(
                [(16.242757102, 25.743646628), (14.092720526, 24.029049673), (20.327618544, 16.210734848), (26.562516563, 8.392420024), (28.71255314, 10.107016979)],
                knots=[3.141592654, 3.141592654, 3.141592654, 4.71238898, 4.71238898, 6.283185307, 6.283185307, 6.283185307], degree=2, weights=[1, 0.707106781, 1, 0.707106781, 1]))
            Line((16.242757102, 25.743646628), (23.237141673, 31.321482195))
            ThreePointArc((23.237141673, 31.321482195), (16.921465826, 35.137785848), (10, 37.69615365))
            Line((10, 37.69615365), (10, 28.75))
            add(Edge.make_bspline(
                [(-10, 28.75), (-10, 26), (0, 26), (10, 26), (10, 28.75)],
                knots=[3.141592654, 3.141592654, 3.141592654, 4.71238898, 4.71238898, 6.283185307, 6.283185307, 6.283185307], degree=2, weights=[1, 0.707106781, 1, 0.707106781, 1]))
        make_face()
    extrude(amount=EXTRUDE_2_DEPTH)

    # 草图3 → 切除-拉伸2 (cut)
    with BuildSketch(Plane.XY.offset(5)):
        with Locations((0, 11)):
            Circle(SKETCH_3_R)
        with Locations((11, 0)):
            Circle(SKETCH_3_R)
        with Locations((0, -11)):
            Circle(SKETCH_3_R)
        with Locations((-11, 0)):
            Circle(SKETCH_3_R)
        Circle(SKETCH_3_R_2)
        with Locations((14.75204713, 30.632941509)):
            Circle(SKETCH_3_R)
        with Locations((33.147549014, 7.565711755)):
            Circle(SKETCH_3_R)
        with Locations((26.582270404, -21.198653263)):
            Circle(SKETCH_3_R)
        with Locations((0, -34)):
            Circle(SKETCH_3_R)
        with Locations((-26.582270404, -21.198653263)):
            Circle(SKETCH_3_R)
        with Locations((-33.147549014, 7.565711755)):
            Circle(SKETCH_3_R)
        with Locations((-14.75204713, 30.632941509)):
            Circle(SKETCH_3_R)
    extrude(amount=-CUT_EXTRUDE_2_DEPTH, mode=Mode.SUBTRACT)


with BuildPart() as part_1:
    # 缩放比例1: scaled about (3.5878e-05, 0, 2.461657496)
    add(part.part.scale(SCALE_1_SCALE).moved(Location((1.1373e-05, 0, 0.780345426))))

    # 圆角2
    fillet_2_edges = [part_1.edges().sort_by_distance(p)[0] for p in [
        (11.557372532, 23.999107734, 0.780345426),
        (25.96916617, 5.927290118, 0.780345426),
        (20.825656572, -16.607897852, 0.780345426),
        (1.1373e-05, -26.637, 0.780345426),
        (-20.825633825, -16.607897852, 0.780345426),
        (-25.969143423, 5.927290118, 0.780345426),
        (-11.557349786, 23.999107734, 0.780345426),
    ]]
    fillet(fillet_2_edges, radius=FILLET_2_R)


solid = part_1.part
